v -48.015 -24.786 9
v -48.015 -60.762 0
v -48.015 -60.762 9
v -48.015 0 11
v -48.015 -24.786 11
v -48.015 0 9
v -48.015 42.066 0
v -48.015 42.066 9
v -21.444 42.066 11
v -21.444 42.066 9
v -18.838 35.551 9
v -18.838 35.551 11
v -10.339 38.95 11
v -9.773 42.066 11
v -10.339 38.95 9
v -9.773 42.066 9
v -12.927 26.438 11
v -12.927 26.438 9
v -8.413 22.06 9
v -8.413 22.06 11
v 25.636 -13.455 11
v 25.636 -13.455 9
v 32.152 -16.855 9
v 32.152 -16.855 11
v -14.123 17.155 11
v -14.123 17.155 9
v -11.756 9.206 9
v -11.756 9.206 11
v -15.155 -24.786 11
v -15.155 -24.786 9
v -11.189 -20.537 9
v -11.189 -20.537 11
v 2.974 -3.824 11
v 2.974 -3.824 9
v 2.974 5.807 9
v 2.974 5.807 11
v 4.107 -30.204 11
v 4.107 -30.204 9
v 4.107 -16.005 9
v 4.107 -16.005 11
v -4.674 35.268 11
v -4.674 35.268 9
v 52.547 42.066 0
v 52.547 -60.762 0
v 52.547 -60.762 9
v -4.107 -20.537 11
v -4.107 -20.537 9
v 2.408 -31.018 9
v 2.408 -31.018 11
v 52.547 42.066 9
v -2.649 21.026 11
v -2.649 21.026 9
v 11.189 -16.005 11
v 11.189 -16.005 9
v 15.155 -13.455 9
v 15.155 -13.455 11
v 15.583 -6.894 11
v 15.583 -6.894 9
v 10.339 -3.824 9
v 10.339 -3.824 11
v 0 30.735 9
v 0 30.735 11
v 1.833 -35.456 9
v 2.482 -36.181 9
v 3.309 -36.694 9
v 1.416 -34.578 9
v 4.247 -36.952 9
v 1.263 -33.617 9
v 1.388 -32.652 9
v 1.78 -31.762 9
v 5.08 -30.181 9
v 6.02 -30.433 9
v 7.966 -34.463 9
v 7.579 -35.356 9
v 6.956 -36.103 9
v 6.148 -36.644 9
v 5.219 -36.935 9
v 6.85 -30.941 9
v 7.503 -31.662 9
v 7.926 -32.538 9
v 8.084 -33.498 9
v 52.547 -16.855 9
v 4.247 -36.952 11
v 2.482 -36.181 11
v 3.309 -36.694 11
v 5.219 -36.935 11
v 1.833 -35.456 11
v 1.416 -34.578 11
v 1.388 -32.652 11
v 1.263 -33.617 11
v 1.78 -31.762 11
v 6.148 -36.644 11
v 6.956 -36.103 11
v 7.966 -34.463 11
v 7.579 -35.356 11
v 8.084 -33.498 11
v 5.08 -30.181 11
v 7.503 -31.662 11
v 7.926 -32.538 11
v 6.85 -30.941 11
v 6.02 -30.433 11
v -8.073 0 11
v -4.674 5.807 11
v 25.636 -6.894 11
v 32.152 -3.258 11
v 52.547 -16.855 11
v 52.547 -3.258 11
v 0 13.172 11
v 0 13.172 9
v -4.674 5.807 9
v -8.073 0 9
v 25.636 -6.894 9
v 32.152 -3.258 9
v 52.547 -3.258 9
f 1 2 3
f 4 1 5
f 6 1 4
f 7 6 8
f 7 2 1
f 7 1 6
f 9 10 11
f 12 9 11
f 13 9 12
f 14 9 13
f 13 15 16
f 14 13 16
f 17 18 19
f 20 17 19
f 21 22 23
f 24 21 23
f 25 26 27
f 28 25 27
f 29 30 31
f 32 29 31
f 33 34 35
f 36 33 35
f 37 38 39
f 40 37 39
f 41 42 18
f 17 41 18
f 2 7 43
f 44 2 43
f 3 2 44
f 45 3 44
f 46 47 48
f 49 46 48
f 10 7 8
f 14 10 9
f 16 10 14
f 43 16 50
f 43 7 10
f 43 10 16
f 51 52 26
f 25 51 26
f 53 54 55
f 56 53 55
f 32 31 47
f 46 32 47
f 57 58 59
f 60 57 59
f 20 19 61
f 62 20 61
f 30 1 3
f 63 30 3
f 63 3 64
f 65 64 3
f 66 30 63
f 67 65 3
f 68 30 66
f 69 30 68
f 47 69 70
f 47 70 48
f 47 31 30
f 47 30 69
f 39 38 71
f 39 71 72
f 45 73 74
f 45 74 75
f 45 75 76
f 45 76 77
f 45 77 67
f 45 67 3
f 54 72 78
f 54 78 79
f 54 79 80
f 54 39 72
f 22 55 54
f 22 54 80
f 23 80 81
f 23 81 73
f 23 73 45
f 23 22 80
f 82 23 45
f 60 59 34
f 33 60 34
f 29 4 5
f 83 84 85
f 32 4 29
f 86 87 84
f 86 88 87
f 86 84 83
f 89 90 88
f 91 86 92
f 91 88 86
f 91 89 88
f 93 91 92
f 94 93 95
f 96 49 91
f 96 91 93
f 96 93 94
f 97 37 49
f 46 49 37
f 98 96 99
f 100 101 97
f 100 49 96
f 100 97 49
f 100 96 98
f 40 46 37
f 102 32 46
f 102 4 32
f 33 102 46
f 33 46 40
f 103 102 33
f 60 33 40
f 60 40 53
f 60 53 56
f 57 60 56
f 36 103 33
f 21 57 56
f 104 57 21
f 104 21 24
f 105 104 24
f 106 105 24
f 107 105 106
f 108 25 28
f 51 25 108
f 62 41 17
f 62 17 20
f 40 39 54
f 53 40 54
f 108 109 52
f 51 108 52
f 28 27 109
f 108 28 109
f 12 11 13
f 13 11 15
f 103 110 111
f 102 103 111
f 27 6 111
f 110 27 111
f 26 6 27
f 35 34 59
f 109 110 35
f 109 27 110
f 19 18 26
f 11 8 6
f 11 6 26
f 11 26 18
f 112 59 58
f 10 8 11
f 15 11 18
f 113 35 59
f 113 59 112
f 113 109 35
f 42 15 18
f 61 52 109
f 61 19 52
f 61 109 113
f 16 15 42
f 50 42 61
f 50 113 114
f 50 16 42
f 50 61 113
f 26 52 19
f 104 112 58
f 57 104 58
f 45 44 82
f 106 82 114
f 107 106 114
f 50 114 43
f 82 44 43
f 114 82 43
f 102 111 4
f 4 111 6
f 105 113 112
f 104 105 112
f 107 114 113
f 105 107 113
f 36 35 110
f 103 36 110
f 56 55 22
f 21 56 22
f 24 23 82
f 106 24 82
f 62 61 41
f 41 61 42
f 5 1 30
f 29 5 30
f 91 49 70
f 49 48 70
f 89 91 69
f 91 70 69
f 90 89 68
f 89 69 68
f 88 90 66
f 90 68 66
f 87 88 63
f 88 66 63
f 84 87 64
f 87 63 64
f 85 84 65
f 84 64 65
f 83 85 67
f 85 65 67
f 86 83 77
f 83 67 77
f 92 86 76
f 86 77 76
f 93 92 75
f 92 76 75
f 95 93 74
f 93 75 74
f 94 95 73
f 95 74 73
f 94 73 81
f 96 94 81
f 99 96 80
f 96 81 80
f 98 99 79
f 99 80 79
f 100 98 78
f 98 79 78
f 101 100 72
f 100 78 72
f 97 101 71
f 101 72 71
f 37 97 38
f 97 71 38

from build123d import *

# Parameters (mm, degrees)
F0_W      = 100.5620509386
F0_H      = 102.8282381594
F1_DEPTH  = 9
F2_R      = 3.4110604721
F3_DEPTH  = 2
F9_DEPTH  = 2
F17_DEPTH = 2
F19_DEPTH = 2
F21_DEPTH = 2


# Not quite as in the source:
# - the program builds the solid bodies; features that only make, move or delete a surface that nothing else refers to are left out


with BuildPart() as f1:
    # F0 (on Top) → F1 (new body)
    with BuildSketch(Plane.XY):
        with Locations((2.2661872208, -9.3480218202)):
            Rectangle(F0_W, F0_H)
    extrude(amount=F1_DEPTH)

    # F2 (on face) → F3 (join)
    with BuildSketch(Plane.XY.offset(9)):
        with Locations((4.6740118414, -33.5678942502)):
            Circle(F2_R)
    extrude(amount=F3_DEPTH)

    # F8 (on face) → F9 (join)
    with BuildSketch(Plane.XY.offset(9)):
        with BuildLine():
            Line((-4.1074641049, -20.5373205245), (2.40785712, -31.0184087486))
            ThreePointArc((2.40785712, -31.0184087486), (3.2003162928, -30.4916050937), (4.1074650362, -30.2042120027))
            Line((4.1074650362, -30.2042120027), (4.1074650362, -16.0049479455))
            Line((4.1074650362, -16.0049479455), (11.1892977729, -16.0049479455))
            Line((11.1892977729, -16.0049479455), (15.155127272, -13.4554868564))
            Line((15.155127272, -13.4554868564), (25.63624084, -13.4554868564))
            Line((25.63624084, -13.4554868564), (32.1515314281, -16.8547667563))
            Line((32.1515314281, -16.8547667563), (52.5472126901, -16.8547667563))
            Line((52.5472126901, -16.8547667563), (52.5472126901, -3.2576438971))
            Line((52.5472126901, -3.2576438971), (32.1515314281, -3.2576438971))
            Line((32.1515314281, -3.2576438971), (25.63624084, -6.8936358156))
            Line((25.63624084, -6.8936358156), (15.5831124042, -6.8936358156))
            Line((15.5831124042, -6.8936358156), (10.3394780308, -3.8241909351))
            Line((10.3394780308, -3.8241909351), (2.9743718915, -3.8241909351))
            Line((2.9743718915, -3.8241909351), (2.9743718915, 5.8071040548))
            Line((2.9743718915, 5.8071040548), (-4.6740109101, 5.8071040548))
            Line((-4.6740109101, 5.8071040548), (-8.0732917413, 0))
            Line((-8.0732917413, 0), (-48.0148382485, 0))
            Line((-48.0148382485, 0), (-48.0148382485, -24.7864220291))
            Line((-48.0148382485, -24.7864220291), (-15.1551263407, -24.7864220291))
            Line((-15.1551263407, -24.7864220291), (-11.1892987043, -20.5373205245))
            Line((-11.1892987043, -20.5373205245), (-4.1074641049, -20.5373205245))
        make_face()
    extrude(amount=F9_DEPTH)

    # F16 (on face) → F17 (join)
    with BuildSketch(Plane.XY.offset(9)):
        Polygon((-14.1233374194, 17.1550600206), (-11.7558455095, 9.2063853517), (0, 13.1722129881), (-2.6493984959, 21.0257866344), align=None)
    extrude(amount=F17_DEPTH)

    # F18 (on face) → F19 (join)
    with BuildSketch(Plane.XY.offset(9)):
        Polygon((0, 30.7351611555), (-4.6740109101, 35.2675393224), (-12.9274129612, 26.4375342768), (-8.4126724433, 22.0596002612), align=None)
    extrude(amount=F19_DEPTH)

    # F20 (on face) → F21 (join)
    with BuildSketch(Plane.XY.offset(9)):
        Polygon((-18.8376810402, 35.5508103967), (-10.3394789621, 38.9500930905), (-9.7729321569, 42.0660972595), (-21.4437972133, 42.0660972595), align=None)
    extrude(amount=F21_DEPTH)


solid = f1.part
